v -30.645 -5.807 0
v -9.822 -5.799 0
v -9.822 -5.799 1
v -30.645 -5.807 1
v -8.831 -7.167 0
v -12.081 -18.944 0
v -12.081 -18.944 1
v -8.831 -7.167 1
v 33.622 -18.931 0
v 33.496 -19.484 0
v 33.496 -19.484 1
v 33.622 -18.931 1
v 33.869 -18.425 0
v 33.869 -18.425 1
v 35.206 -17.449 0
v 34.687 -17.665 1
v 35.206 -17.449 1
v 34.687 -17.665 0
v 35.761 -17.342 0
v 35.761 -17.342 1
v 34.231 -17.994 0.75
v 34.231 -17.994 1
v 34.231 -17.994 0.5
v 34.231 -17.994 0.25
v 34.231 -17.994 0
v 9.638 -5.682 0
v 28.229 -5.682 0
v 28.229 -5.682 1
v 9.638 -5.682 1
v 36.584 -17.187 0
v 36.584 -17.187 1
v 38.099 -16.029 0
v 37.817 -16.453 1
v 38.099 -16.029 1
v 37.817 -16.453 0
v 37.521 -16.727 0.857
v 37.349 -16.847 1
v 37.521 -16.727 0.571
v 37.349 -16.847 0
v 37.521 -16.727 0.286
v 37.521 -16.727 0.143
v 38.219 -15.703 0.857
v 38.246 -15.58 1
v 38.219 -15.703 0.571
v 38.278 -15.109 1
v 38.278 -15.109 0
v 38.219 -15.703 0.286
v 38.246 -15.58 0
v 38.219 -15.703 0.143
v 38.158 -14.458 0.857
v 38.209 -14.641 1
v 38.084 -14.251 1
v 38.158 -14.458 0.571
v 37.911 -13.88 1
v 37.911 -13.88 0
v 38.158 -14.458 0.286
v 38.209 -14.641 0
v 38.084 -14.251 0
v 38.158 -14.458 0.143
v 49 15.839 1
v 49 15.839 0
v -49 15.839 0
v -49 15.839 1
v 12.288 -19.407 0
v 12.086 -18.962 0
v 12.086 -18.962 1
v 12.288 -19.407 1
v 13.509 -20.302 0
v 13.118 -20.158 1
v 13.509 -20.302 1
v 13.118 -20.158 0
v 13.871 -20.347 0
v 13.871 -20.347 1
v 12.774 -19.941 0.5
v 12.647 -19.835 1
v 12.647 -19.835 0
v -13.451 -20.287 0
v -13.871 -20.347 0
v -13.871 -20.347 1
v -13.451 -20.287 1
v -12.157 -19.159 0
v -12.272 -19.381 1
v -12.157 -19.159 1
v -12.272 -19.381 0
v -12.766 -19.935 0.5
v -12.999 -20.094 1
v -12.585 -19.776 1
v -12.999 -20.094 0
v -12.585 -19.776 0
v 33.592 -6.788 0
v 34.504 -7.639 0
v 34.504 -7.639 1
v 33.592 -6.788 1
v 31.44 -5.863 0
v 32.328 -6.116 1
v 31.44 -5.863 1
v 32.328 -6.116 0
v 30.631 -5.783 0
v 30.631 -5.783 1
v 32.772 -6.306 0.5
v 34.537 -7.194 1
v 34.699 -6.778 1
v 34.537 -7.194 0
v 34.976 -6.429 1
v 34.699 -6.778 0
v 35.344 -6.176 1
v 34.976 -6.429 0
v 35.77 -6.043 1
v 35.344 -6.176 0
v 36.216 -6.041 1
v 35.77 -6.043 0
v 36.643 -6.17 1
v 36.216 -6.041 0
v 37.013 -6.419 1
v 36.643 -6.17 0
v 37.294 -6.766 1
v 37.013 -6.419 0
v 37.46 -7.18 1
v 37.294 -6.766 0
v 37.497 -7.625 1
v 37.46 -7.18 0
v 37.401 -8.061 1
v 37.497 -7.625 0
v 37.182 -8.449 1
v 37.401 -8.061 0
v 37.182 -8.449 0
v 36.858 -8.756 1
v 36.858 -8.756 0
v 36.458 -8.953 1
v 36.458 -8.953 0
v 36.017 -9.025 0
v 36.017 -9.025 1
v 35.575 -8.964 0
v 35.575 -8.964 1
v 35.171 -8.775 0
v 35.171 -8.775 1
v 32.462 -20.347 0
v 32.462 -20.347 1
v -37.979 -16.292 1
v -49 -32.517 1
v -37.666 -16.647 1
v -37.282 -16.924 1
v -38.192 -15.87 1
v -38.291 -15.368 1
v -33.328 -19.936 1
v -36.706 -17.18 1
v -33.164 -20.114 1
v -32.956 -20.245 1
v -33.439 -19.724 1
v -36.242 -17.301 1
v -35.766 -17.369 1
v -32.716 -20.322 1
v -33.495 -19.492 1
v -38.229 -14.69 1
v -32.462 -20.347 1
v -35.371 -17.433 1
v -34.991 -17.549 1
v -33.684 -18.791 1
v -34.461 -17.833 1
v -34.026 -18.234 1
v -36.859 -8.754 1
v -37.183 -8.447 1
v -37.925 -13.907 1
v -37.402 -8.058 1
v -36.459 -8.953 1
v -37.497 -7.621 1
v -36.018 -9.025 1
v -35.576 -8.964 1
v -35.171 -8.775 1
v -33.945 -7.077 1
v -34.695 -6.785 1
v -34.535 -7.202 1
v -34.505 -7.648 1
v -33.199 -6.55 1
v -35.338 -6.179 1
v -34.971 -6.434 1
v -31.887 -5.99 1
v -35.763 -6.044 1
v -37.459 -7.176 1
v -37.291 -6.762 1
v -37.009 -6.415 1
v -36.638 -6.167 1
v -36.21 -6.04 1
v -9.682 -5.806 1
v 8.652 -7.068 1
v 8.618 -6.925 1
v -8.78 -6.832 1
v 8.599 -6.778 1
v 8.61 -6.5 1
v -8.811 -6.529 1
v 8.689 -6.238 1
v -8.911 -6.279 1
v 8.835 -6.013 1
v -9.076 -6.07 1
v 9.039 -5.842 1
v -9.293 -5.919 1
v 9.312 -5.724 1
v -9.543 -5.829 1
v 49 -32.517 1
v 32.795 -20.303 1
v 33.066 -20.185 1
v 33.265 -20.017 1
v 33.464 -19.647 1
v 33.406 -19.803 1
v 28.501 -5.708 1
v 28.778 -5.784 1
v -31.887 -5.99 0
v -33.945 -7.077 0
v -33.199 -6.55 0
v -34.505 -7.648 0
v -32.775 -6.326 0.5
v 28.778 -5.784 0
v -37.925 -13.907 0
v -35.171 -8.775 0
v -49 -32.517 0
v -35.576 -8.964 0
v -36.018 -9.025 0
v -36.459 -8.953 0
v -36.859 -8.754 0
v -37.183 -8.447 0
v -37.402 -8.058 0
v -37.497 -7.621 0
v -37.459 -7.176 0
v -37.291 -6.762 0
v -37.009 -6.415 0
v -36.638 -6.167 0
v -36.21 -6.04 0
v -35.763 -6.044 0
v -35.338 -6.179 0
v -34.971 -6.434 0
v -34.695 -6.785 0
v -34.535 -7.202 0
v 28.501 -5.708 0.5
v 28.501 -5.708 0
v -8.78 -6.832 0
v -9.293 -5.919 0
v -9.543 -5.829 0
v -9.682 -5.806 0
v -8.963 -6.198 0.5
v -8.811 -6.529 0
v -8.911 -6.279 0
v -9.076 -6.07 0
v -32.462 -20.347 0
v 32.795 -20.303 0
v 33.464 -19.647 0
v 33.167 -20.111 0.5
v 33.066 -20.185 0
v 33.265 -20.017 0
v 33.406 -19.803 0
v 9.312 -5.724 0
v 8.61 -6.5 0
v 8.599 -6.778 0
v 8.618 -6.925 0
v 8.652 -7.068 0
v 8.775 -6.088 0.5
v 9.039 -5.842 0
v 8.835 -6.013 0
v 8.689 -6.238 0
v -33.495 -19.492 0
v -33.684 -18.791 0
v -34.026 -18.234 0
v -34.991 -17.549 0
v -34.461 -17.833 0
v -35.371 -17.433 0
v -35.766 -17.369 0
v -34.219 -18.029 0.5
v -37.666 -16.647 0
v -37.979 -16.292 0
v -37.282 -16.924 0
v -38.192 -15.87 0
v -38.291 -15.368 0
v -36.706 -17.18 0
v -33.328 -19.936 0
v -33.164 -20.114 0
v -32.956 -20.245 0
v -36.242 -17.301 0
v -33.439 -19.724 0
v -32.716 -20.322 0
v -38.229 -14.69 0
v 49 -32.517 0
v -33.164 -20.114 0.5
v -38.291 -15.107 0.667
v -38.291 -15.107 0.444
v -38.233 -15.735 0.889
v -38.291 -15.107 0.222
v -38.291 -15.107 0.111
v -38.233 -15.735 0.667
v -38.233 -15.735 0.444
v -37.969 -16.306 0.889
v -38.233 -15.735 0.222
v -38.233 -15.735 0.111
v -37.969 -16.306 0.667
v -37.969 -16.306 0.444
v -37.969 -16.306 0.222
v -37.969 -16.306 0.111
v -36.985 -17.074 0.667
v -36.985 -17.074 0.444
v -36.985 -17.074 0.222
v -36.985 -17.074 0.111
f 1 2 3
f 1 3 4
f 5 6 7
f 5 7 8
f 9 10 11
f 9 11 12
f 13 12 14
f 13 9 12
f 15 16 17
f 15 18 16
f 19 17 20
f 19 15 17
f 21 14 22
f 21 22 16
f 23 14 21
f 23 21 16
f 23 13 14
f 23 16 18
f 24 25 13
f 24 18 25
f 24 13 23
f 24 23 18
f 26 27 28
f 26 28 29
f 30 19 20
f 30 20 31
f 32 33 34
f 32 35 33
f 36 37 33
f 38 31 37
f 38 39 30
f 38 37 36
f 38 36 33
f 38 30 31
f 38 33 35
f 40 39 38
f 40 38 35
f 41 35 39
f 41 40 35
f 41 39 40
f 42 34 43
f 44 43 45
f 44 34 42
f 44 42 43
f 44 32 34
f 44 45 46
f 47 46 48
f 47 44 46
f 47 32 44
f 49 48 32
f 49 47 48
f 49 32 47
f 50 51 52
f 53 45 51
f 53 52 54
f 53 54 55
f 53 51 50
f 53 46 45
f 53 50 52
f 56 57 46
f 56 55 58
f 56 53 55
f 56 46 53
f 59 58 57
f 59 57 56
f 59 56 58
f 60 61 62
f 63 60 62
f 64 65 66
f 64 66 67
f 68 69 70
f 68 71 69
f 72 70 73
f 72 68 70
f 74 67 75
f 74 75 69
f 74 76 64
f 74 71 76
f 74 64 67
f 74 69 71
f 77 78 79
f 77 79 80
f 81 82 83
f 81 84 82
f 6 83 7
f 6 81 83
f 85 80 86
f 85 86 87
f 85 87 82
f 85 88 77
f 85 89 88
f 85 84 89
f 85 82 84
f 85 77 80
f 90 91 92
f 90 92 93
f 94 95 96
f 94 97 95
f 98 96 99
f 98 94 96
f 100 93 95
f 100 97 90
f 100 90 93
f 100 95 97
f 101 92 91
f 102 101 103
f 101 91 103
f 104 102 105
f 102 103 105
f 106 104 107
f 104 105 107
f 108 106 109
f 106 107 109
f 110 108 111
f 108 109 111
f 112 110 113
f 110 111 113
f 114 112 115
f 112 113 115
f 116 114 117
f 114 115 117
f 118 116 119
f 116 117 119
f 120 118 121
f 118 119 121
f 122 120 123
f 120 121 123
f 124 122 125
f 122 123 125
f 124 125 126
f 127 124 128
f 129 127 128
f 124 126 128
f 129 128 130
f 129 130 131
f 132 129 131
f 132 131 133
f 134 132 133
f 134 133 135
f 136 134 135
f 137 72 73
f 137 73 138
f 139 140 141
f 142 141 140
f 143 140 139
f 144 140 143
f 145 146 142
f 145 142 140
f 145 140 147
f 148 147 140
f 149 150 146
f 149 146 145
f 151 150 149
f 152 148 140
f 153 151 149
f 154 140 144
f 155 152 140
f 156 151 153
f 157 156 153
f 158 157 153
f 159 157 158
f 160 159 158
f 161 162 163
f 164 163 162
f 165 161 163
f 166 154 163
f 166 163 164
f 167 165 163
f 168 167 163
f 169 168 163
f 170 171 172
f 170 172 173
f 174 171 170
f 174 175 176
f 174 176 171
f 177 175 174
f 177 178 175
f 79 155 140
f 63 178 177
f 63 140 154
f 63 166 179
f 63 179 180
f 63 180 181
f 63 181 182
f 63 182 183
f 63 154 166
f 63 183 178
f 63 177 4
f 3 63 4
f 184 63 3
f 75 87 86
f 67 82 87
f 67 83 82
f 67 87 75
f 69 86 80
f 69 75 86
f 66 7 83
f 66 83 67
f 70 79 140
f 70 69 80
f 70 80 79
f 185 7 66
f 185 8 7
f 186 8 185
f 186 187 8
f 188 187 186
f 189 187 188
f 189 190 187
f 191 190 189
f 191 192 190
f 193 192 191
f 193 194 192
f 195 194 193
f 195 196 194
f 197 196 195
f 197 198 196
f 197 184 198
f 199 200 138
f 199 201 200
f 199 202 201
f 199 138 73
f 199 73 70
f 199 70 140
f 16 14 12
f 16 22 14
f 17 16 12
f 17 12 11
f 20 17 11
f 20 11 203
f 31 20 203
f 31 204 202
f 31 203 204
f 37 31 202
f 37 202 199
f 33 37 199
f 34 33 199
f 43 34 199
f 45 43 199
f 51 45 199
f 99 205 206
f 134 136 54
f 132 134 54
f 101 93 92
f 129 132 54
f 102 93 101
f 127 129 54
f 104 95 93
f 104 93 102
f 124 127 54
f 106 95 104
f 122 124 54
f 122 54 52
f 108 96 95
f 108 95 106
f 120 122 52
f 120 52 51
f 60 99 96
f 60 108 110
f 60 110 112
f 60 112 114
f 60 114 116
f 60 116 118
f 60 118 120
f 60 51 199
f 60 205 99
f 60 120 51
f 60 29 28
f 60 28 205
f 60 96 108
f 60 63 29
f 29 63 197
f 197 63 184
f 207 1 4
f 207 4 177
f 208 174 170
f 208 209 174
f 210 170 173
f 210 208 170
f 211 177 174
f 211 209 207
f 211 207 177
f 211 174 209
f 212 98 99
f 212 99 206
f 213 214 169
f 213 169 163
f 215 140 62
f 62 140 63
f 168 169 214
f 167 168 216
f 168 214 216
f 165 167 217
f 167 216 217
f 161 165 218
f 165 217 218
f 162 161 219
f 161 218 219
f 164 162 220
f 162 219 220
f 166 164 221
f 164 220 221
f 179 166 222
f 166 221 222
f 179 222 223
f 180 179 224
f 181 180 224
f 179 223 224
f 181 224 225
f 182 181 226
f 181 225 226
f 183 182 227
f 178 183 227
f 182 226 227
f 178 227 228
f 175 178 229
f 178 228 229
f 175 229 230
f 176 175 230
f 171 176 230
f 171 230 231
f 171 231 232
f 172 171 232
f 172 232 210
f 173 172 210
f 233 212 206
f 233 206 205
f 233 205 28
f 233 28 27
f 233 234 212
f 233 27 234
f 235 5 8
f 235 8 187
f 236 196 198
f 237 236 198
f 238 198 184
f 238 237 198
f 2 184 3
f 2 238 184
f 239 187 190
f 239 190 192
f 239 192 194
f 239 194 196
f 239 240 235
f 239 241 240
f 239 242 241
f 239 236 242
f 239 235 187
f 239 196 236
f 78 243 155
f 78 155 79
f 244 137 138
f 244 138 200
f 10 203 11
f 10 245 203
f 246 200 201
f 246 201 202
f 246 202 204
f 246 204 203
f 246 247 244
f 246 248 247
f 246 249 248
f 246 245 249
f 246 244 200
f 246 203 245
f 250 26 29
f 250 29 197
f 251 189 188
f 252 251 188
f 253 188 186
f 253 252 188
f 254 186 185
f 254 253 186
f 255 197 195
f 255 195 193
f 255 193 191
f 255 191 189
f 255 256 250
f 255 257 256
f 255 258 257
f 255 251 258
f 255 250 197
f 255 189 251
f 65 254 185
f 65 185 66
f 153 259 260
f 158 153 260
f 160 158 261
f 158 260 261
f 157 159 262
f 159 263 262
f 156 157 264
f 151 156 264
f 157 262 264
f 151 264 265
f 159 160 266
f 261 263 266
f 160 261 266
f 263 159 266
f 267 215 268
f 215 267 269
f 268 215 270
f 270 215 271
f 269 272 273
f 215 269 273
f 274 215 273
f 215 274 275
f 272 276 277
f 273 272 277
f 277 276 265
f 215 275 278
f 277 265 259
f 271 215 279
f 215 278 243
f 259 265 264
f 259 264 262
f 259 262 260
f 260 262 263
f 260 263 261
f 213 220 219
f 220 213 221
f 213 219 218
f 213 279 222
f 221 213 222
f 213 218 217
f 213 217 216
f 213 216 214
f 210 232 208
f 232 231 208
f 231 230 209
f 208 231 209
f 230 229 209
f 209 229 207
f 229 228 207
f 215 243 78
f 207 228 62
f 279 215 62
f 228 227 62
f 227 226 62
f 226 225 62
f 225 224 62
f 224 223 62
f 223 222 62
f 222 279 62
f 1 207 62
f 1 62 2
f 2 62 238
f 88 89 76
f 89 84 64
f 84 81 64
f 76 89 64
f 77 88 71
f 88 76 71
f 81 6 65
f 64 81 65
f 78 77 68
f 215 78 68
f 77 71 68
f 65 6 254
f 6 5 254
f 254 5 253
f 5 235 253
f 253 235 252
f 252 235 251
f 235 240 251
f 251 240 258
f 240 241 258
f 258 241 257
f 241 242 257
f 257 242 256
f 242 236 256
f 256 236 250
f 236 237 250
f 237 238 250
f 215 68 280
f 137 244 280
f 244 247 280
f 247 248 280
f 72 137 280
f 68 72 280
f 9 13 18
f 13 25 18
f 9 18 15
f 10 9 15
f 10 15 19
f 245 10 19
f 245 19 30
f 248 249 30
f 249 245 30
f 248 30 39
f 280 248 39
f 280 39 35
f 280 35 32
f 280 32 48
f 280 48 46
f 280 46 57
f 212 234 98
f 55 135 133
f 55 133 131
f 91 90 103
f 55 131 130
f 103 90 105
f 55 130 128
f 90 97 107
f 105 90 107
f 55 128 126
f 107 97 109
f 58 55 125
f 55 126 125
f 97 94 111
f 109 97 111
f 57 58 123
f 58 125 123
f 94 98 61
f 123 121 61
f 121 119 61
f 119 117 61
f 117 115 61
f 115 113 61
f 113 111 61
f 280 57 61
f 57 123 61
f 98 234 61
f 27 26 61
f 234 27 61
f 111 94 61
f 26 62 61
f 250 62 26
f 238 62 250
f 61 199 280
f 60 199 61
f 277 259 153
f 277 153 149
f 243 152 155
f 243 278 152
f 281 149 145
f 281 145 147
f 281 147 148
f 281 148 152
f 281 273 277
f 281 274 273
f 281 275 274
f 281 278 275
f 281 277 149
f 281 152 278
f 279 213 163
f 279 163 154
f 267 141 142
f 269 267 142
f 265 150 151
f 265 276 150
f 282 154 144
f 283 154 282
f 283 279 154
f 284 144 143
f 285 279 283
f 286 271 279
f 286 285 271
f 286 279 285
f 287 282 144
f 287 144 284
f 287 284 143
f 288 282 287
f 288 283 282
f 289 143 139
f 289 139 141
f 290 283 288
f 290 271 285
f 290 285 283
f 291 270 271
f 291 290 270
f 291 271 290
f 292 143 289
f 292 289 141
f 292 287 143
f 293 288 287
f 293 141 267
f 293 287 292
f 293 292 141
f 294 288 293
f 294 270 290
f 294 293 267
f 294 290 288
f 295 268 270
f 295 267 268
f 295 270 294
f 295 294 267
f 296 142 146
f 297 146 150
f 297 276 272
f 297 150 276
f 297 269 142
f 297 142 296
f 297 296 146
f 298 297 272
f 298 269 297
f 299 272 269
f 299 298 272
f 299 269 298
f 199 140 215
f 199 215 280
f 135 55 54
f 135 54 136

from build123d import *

# Parameters (mm, degrees)
EXTRUDE_1_DEPTH     = 1
CUT_EXTRUDE_4_DEPTH = 54.935146241
SKETCH_4_R          = 1.5
CUT_EXTRUDE_5_DEPTH = 54.935146241
CUT_EXTRUDE1_START  = -1
CUT_EXTRUDE1_DEPTH  = 1
SKETCH4_W           = 98
SKETCH4_H           = 10
BOSS_EXTRUDE1_DEPTH = 1


with BuildPart() as part:
    # Эскиз1 → Бобышка-Вытянуть1 (new body)
    with BuildSketch(Plane.XY):
        Polygon((-49, 5.839183832), (-49, -22.516660498), (49, -22.516660498), (49, 5.839183832), (49, 15.839183832), (-49, 15.839183832), align=None)
    extrude(amount=EXTRUDE_1_DEPTH)

    # Эскиз2 → Вырез-Вытянуть4 (cut, through all)
    with BuildSketch(Plane(origin=(0, 0, 0), x_dir=(-1, 0, 0), z_dir=(0, 0, -1))):
        with BuildLine():
            Line((27.226146034, -9.122134253), (15.739905482, -9.122134253))
            ThreePointArc((15.739905482, -9.122134253), (15.10500819, -9.461530461), (14.917793913, -10.156681647))
            Line((14.917793913, -10.156681647), (17.442090319, -18.930924047))
            ThreePointArc((17.442090319, -18.930924047), (18.050493328, -19.909298147), (19.122649731, -20.331021695))
            Line((19.122649731, -20.331021695), (30.826843589, -20.331021695))
            ThreePointArc((30.826843589, -20.331021695), (31.459345435, -19.990005133), (31.64325008, -19.295361367))
            Line((31.64325008, -19.295361367), (29.100959308, -10.488607797))
            ThreePointArc((29.100959308, -10.488607797), (28.40806584, -9.469896887), (27.226146034, -9.122134253))
        make_face()
        with BuildLine():
            Line((-31.64325008, -19.295361367), (-29.100959308, -10.488607797))
            ThreePointArc((-29.100959308, -10.488607797), (-28.40806584, -9.469896887), (-27.226146034, -9.122134253))
            Line((-27.226146034, -9.122134253), (-15.739905482, -9.122134253))
            ThreePointArc((-15.739905482, -9.122134253), (-15.10500819, -9.461530461), (-14.917793913, -10.156681647))
            Line((-14.917793913, -10.156681647), (-17.442090319, -18.930924047))
            ThreePointArc((-17.442090319, -18.930924047), (-18.050493328, -19.909298147), (-19.122649731, -20.331021695))
            Line((-19.122649731, -20.331021695), (-30.826843589, -20.331021695))
            ThreePointArc((-30.826843589, -20.331021695), (-31.459345435, -19.990005133), (-31.64325008, -19.295361367))
        make_face()
    extrude(amount=-CUT_EXTRUDE_4_DEPTH, mode=Mode.SUBTRACT)

    # Эскиз4 → Вырез-Вытянуть5 (cut, through all)
    with BuildSketch(Plane(origin=(0, 0, 0), x_dir=(-1, 0, 0), z_dir=(0, 0, -1))):
        with Locations((36, -7.524952718)):
            Circle(SKETCH_4_R)
        with Locations((-36, -7.524952718)):
            Circle(SKETCH_4_R)
    extrude(amount=-CUT_EXTRUDE_5_DEPTH, mode=Mode.SUBTRACT)

    # Sketch3 → Cut-Extrude1 (cut)
    with BuildSketch(Plane.XY.offset(1).offset(CUT_EXTRUDE1_START)):
        with BuildLine():
            Line((8.652344227, -7.068131311), (12.085677561, -18.961546856))
            add(Edge.make_bspline(
                [(12.085677561, -18.961546856), (12.485677561, -20.347187502), (13.871318207, -20.347187502)],
                knots=[0.857071948, 0.857071948, 0.857071948, 2.427868275, 2.427868275, 2.427868275], degree=2, weights=[1, 0.707106781, 1]))
            Line((13.871318207, -20.347187502), (32.461996875, -20.347187502))
            add(Edge.make_bspline(
                [(32.461996875, -20.347187502), (33.393769403, -20.347187502), (33.496157418, -19.484255682)],
                knots=[2.427868275, 2.427868275, 2.427868275, 3.611858299, 3.611858299, 3.611858299], degree=2, weights=[1, 0.829829079, 1]))
            add(Edge.make_bspline(
                [(33.496157418, -19.484255682), (33.529743577, -19.201189685), (33.607326061, -18.923570429), (33.853252735, -18.417152493), (34.025349409, -18.183932413), (34.436238564, -17.8036127), (34.681879478, -17.649935655), (35.200024528, -17.435065661), (35.479061866, -17.369439067), (35.76148791, -17.34207634)],
                knots=[0, 0, 0, 0, 0.25, 0.25, 0.5, 0.5, 0.75, 0.75, 1, 1, 1, 1], degree=3))
            add(Edge.make_bspline(
                [(35.76148791, -17.34207634), (36.181169226, -17.301415694), (36.592378309, -17.212108423), (37.170380488, -16.959028015), (37.354968395, -16.854344533), (37.687544868, -16.599797528), (37.83830967, -16.446579579), (38.076557482, -16.101495837), (38.166209489, -15.905573827), (38.271501218, -15.499696694), (38.288800836, -15.285469364), (38.263278752, -14.867475934), (38.220734772, -14.657932914), (38.094284502, -14.258193956), (38.010543981, -14.065974434), (37.910619322, -13.879789794)],
                knots=[0, 0, 0, 0, 0.25, 0.25, 0.375, 0.375, 0.5, 0.5, 0.625, 0.625, 0.75, 0.75, 0.875, 0.875, 1, 1, 1, 1], degree=3))
            Line((37.910619322, -13.879789794), (35.170885606, -8.774980446))
            ThreePointArc((35.170885606, -8.774980446), (34.803783463, -8.429975368), (34.571610551, -7.982886756))
            ThreePointArc((34.571610551, -7.982886756), (34.527886571, -7.812845152), (34.504331156, -7.638859302))
            add(Edge.make_bspline(
                [(34.504331156, -7.638859302), (33.03670289, -5.782259548), (30.630891119, -5.783194379)],
                knots=[4.00651056, 4.00651056, 4.00651056, 5.38030343, 5.38030343, 5.38030343], degree=2, weights=[1, 0.773217832, 1]))
            Line((30.630891119, -5.783194379), (28.778313515, -5.783914238))
            add(Edge.make_bspline(
                [(28.778313515, -5.783914238), (28.498733332, -5.682490665), (28.228663541, -5.682490665)],
                knots=[5.18447533, 5.18447533, 5.18447533, 5.569460928, 5.569460928, 5.569460928], degree=2, weights=[1, 0.981530397, 1]))
            Line((28.228663541, -5.682490665), (9.637984874, -5.682490665))
            add(Edge.make_bspline(
                [(9.637984874, -5.682490665), (8.252344227, -5.682490665), (8.652344227, -7.068131311)],
                knots=[5.569460928, 5.569460928, 5.569460928, 7.140257255, 7.140257255, 7.140257255], degree=2, weights=[1, 0.707106781, 1]))
        make_face()
        with BuildLine():
            Line((-35.170885606, -8.774980446), (-37.925052204, -13.906681863))
            add(Edge.make_bspline(
                [(-37.925052204, -13.906681863), (-38.025225081, -14.093328995), (-38.109806595, -14.28778394), (-38.235924368, -14.687324932), (-38.278394681, -14.895918794), (-38.297414091, -15.212202185), (-38.296322734, -15.317469634), (-38.277441195, -15.527644209), (-38.259343447, -15.633280004), (-38.205994928, -15.836909506), (-38.170798519, -15.935630825), (-38.082894213, -16.126717018), (-38.029532599, -16.219817403), (-37.849055501, -16.479499021), (-37.698892817, -16.631115336), (-37.362837335, -16.886481906), (-37.179664999, -16.989484869), (-36.595923377, -17.242719775), (-36.186794345, -17.329699001), (-35.766265682, -17.369273893)],
                knots=[0, 0, 0, 0, 0.125, 0.125, 0.25, 0.25, 0.3125, 0.3125, 0.375, 0.375, 0.4375, 0.4375, 0.5, 0.5, 0.625, 0.625, 0.75, 0.75, 1, 1, 1, 1], degree=3))
            add(Edge.make_bspline(
                [(-33.495182661, -19.492227082), (-33.738478544, -17.560103824), (-35.766265682, -17.369273893)],
                knots=[5.81913938, 5.81913938, 5.81913938, 6.905546226, 6.905546226, 6.905546226], degree=2, weights=[1, 0.856057288, 1]))
            add(Edge.make_bspline(
                [(-33.495182661, -19.492227082), (-33.387524752, -20.347187502), (-32.461996875, -20.347187502)],
                knots=[2.677546726, 2.677546726, 2.677546726, 3.855317033, 3.855317033, 3.855317033], degree=2, weights=[1, 0.83156042, 1]))
            Line((-32.461996875, -20.347187502), (-13.871318207, -20.347187502))
            add(Edge.make_bspline(
                [(-13.871318207, -20.347187502), (-12.46794332, -20.347187502), (-12.080702928, -18.943926093)],
                knots=[3.855317033, 3.855317033, 3.855317033, 5.438830393, 5.438830393, 5.438830393], degree=2, weights=[1, 0.702596367, 1]))
            Line((-12.080702928, -18.943926093), (-8.83075434, -7.166932971))
            add(Edge.make_bspline(
                [(-8.83075434, -7.166932971), (-8.45309236, -5.798381309), (-9.82190813, -5.798913193)],
                knots=[5.438830393, 5.438830393, 5.438830393, 6.997298301, 6.997298301, 6.997298301], degree=2, weights=[1, 0.711452073, 1]))
            Line((-9.82190813, -5.798913193), (-30.645016113, -5.807004464))
            add(Edge.make_bspline(
                [(-30.645016113, -5.807004464), (-33.032902471, -5.807932329), (-34.505069218, -7.648167801)],
                knots=[0.90305787, 0.90305787, 0.90305787, 2.269113721, 2.269113721, 2.269113721], degree=2, weights=[1, 0.775665219, 1]))
            ThreePointArc((-34.505069218, -7.648167801), (-34.53118454, -7.829224215), (-34.579145022, -8.005755309))
            ThreePointArc((-34.579145022, -8.005755309), (-34.811085633, -8.43954696), (-35.170885606, -8.774980446))
        make_face()
    extrude(amount=CUT_EXTRUDE1_DEPTH, mode=Mode.SUBTRACT)

    # Sketch4 → Boss-Extrude1 (add)
    with BuildSketch(Plane.XY.offset(1)):
        with Locations((0, -27.516660498)):
            Rectangle(SKETCH4_W, SKETCH4_H)
    extrude(amount=-BOSS_EXTRUDE1_DEPTH)


solid = part.part
